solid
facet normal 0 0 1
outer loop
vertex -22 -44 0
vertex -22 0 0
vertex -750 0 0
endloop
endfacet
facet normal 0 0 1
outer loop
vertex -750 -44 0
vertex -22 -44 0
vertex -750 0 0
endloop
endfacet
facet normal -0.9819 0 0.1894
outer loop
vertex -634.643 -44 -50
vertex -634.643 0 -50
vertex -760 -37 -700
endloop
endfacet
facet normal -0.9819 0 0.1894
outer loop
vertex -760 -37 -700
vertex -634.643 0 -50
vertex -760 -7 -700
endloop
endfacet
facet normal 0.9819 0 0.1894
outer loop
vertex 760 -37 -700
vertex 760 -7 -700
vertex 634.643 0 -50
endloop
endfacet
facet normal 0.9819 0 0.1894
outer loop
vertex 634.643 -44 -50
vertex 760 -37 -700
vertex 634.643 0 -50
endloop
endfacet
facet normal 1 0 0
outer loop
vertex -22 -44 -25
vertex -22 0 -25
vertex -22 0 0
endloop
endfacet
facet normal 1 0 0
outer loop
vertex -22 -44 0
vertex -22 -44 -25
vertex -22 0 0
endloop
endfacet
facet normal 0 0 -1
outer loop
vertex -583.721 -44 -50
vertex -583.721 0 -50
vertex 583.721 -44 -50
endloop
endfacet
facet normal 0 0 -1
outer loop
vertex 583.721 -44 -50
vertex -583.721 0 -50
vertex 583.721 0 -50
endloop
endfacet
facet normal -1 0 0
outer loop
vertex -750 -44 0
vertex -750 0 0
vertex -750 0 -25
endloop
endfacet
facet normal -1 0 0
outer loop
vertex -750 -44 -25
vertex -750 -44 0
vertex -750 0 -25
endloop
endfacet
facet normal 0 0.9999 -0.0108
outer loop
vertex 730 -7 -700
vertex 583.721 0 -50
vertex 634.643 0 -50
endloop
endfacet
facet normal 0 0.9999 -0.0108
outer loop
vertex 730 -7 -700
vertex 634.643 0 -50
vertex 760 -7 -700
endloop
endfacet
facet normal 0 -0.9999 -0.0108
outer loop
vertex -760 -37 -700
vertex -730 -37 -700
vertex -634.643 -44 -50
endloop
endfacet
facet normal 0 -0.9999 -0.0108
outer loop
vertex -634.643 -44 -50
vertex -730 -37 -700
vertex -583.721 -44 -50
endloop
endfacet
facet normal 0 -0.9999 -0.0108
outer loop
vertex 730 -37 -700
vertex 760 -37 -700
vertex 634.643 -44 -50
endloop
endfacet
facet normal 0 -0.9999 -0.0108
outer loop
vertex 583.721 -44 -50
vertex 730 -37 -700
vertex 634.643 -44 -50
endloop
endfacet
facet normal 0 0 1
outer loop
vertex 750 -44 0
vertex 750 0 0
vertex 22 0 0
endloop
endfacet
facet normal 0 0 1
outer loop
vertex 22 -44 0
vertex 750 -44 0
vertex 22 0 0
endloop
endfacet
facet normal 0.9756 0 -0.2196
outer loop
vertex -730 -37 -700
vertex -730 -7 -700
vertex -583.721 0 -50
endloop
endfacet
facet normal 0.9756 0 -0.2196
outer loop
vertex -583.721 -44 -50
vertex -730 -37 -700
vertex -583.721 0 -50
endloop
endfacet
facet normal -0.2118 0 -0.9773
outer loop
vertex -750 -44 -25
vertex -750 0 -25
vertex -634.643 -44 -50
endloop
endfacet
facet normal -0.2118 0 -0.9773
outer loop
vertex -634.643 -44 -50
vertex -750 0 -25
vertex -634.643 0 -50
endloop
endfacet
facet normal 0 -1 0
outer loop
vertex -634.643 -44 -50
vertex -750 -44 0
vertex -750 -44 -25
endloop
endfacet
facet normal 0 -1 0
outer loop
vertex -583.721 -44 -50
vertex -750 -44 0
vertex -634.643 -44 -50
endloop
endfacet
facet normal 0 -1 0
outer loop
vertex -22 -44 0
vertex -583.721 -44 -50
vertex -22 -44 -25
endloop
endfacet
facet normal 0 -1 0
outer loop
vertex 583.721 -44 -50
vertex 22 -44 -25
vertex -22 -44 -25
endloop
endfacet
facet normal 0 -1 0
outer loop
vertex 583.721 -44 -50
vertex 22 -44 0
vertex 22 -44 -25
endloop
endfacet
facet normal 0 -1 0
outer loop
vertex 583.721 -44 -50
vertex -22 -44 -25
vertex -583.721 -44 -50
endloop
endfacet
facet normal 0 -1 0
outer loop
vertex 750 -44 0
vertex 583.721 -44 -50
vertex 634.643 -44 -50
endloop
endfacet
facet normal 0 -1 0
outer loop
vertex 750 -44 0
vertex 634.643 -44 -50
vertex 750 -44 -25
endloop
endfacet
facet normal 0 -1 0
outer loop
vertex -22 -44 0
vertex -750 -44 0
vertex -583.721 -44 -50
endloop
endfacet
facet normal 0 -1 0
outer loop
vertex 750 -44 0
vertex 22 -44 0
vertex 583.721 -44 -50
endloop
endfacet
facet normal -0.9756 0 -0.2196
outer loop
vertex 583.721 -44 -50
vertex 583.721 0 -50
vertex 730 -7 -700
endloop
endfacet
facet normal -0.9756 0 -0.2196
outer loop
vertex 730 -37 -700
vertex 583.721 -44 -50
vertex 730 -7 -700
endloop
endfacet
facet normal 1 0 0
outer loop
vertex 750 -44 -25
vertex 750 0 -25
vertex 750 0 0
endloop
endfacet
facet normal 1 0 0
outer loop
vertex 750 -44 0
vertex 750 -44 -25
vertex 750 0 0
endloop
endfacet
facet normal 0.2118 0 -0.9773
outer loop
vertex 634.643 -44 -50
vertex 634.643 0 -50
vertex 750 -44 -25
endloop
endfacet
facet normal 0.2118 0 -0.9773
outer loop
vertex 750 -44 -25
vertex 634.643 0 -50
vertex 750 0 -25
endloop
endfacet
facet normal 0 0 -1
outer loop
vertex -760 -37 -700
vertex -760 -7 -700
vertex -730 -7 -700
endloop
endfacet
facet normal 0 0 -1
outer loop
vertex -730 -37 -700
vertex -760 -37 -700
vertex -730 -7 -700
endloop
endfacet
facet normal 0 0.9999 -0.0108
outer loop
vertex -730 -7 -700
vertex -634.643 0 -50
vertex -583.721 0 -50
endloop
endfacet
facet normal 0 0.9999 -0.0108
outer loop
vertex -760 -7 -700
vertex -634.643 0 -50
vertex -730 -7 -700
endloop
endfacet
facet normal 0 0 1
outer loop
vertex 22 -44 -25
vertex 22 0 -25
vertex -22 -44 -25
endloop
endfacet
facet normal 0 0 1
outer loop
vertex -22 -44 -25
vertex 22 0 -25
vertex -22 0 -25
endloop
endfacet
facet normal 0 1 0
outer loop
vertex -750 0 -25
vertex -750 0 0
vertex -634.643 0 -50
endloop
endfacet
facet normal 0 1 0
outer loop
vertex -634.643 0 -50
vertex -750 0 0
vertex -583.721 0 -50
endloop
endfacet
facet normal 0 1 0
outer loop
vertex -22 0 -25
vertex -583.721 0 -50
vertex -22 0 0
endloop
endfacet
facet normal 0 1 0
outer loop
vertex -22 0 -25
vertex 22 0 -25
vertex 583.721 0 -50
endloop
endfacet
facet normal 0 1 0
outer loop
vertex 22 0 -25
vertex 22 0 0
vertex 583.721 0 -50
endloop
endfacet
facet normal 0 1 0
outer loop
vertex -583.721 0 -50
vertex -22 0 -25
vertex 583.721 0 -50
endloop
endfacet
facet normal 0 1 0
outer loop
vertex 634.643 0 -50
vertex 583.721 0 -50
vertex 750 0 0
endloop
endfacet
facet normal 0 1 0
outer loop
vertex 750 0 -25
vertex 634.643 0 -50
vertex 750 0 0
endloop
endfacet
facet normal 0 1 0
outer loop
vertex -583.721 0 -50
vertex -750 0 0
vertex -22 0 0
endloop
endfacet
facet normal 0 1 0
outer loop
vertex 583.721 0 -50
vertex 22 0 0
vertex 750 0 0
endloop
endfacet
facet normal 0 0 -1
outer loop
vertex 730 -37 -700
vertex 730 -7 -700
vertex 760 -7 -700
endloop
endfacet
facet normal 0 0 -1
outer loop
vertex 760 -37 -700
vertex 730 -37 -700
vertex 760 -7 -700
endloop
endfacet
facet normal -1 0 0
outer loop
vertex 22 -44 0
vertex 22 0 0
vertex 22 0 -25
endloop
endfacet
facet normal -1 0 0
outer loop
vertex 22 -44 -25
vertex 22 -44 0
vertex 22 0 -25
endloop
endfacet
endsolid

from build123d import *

# Parameters (mm, degrees)
F1_DEPTH = 44
F3_DEPTH = 904


with BuildPart() as f1:
    # F0 (on Front) → F1 (new body)
    with BuildSketch(Plane.XZ):
        Polygon((-22, -25), (-22, 0), (-750, 0), (-750, -25), (-634.642857, -50), (-760, -700), (-730, -700), (-583.721499, -50), (0, -50), (583.721499, -50), (730, -700), (760, -700), (634.642857, -50), (750, -25), (750, 0), (22, 0), (22, -25), (0, -25), align=None)
    extrude(amount=F1_DEPTH)

    # F2 (on Right) → F3 (cut, symmetric)
    with BuildSketch(Plane.YZ):
        Polygon((0, -700), (0, -50), (-7, -700), align=None)
        Polygon((-44, -700), (-37, -700), (-44, -50), align=None)
    extrude(amount=F3_DEPTH, both=True, mode=Mode.SUBTRACT)


solid = f1.part
